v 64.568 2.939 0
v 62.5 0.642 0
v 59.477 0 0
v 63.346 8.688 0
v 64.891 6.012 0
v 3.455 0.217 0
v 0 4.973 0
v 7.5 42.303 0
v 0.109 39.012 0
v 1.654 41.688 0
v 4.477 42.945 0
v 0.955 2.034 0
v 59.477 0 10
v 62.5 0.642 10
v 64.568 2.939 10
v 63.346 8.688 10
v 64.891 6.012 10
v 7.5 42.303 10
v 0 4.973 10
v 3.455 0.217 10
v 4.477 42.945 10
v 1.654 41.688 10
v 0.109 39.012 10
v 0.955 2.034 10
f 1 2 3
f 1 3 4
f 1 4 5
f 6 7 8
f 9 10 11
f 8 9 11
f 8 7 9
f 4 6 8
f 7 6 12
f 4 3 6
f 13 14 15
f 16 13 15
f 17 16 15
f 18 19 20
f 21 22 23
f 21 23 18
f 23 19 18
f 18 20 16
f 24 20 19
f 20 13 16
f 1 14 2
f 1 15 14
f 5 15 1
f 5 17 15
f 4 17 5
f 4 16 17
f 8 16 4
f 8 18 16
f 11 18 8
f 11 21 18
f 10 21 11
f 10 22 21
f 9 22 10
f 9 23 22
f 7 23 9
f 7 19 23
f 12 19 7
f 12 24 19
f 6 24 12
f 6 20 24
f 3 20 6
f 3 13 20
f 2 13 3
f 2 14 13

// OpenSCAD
$fn = 32;

// ----------------------------------------------------------------------
// Lever arm: two bosses 10 and 10 mm, 55 mm between centres
// ----------------------------------------------------------------------

// --- parameters (mm) ---
profile_height = 10;      // extrusion height
profile_points = 12;      // points of the closed outline

profile = [[0, 4.973], [0.955, 2.034], [3.455, 0.217], [59.477, 0], [62.5, 0.642], [64.568, 2.939], [64.891, 6.012], [63.346, 8.688], [7.5, 42.303], [4.477, 42.945], [1.654, 41.688], [0.109, 39.012]];  // single closed polygon, 12 points, counter clockwise

// --- the one profile operation ---
linear_extrude(height = profile_height) polygon(points = profile);
